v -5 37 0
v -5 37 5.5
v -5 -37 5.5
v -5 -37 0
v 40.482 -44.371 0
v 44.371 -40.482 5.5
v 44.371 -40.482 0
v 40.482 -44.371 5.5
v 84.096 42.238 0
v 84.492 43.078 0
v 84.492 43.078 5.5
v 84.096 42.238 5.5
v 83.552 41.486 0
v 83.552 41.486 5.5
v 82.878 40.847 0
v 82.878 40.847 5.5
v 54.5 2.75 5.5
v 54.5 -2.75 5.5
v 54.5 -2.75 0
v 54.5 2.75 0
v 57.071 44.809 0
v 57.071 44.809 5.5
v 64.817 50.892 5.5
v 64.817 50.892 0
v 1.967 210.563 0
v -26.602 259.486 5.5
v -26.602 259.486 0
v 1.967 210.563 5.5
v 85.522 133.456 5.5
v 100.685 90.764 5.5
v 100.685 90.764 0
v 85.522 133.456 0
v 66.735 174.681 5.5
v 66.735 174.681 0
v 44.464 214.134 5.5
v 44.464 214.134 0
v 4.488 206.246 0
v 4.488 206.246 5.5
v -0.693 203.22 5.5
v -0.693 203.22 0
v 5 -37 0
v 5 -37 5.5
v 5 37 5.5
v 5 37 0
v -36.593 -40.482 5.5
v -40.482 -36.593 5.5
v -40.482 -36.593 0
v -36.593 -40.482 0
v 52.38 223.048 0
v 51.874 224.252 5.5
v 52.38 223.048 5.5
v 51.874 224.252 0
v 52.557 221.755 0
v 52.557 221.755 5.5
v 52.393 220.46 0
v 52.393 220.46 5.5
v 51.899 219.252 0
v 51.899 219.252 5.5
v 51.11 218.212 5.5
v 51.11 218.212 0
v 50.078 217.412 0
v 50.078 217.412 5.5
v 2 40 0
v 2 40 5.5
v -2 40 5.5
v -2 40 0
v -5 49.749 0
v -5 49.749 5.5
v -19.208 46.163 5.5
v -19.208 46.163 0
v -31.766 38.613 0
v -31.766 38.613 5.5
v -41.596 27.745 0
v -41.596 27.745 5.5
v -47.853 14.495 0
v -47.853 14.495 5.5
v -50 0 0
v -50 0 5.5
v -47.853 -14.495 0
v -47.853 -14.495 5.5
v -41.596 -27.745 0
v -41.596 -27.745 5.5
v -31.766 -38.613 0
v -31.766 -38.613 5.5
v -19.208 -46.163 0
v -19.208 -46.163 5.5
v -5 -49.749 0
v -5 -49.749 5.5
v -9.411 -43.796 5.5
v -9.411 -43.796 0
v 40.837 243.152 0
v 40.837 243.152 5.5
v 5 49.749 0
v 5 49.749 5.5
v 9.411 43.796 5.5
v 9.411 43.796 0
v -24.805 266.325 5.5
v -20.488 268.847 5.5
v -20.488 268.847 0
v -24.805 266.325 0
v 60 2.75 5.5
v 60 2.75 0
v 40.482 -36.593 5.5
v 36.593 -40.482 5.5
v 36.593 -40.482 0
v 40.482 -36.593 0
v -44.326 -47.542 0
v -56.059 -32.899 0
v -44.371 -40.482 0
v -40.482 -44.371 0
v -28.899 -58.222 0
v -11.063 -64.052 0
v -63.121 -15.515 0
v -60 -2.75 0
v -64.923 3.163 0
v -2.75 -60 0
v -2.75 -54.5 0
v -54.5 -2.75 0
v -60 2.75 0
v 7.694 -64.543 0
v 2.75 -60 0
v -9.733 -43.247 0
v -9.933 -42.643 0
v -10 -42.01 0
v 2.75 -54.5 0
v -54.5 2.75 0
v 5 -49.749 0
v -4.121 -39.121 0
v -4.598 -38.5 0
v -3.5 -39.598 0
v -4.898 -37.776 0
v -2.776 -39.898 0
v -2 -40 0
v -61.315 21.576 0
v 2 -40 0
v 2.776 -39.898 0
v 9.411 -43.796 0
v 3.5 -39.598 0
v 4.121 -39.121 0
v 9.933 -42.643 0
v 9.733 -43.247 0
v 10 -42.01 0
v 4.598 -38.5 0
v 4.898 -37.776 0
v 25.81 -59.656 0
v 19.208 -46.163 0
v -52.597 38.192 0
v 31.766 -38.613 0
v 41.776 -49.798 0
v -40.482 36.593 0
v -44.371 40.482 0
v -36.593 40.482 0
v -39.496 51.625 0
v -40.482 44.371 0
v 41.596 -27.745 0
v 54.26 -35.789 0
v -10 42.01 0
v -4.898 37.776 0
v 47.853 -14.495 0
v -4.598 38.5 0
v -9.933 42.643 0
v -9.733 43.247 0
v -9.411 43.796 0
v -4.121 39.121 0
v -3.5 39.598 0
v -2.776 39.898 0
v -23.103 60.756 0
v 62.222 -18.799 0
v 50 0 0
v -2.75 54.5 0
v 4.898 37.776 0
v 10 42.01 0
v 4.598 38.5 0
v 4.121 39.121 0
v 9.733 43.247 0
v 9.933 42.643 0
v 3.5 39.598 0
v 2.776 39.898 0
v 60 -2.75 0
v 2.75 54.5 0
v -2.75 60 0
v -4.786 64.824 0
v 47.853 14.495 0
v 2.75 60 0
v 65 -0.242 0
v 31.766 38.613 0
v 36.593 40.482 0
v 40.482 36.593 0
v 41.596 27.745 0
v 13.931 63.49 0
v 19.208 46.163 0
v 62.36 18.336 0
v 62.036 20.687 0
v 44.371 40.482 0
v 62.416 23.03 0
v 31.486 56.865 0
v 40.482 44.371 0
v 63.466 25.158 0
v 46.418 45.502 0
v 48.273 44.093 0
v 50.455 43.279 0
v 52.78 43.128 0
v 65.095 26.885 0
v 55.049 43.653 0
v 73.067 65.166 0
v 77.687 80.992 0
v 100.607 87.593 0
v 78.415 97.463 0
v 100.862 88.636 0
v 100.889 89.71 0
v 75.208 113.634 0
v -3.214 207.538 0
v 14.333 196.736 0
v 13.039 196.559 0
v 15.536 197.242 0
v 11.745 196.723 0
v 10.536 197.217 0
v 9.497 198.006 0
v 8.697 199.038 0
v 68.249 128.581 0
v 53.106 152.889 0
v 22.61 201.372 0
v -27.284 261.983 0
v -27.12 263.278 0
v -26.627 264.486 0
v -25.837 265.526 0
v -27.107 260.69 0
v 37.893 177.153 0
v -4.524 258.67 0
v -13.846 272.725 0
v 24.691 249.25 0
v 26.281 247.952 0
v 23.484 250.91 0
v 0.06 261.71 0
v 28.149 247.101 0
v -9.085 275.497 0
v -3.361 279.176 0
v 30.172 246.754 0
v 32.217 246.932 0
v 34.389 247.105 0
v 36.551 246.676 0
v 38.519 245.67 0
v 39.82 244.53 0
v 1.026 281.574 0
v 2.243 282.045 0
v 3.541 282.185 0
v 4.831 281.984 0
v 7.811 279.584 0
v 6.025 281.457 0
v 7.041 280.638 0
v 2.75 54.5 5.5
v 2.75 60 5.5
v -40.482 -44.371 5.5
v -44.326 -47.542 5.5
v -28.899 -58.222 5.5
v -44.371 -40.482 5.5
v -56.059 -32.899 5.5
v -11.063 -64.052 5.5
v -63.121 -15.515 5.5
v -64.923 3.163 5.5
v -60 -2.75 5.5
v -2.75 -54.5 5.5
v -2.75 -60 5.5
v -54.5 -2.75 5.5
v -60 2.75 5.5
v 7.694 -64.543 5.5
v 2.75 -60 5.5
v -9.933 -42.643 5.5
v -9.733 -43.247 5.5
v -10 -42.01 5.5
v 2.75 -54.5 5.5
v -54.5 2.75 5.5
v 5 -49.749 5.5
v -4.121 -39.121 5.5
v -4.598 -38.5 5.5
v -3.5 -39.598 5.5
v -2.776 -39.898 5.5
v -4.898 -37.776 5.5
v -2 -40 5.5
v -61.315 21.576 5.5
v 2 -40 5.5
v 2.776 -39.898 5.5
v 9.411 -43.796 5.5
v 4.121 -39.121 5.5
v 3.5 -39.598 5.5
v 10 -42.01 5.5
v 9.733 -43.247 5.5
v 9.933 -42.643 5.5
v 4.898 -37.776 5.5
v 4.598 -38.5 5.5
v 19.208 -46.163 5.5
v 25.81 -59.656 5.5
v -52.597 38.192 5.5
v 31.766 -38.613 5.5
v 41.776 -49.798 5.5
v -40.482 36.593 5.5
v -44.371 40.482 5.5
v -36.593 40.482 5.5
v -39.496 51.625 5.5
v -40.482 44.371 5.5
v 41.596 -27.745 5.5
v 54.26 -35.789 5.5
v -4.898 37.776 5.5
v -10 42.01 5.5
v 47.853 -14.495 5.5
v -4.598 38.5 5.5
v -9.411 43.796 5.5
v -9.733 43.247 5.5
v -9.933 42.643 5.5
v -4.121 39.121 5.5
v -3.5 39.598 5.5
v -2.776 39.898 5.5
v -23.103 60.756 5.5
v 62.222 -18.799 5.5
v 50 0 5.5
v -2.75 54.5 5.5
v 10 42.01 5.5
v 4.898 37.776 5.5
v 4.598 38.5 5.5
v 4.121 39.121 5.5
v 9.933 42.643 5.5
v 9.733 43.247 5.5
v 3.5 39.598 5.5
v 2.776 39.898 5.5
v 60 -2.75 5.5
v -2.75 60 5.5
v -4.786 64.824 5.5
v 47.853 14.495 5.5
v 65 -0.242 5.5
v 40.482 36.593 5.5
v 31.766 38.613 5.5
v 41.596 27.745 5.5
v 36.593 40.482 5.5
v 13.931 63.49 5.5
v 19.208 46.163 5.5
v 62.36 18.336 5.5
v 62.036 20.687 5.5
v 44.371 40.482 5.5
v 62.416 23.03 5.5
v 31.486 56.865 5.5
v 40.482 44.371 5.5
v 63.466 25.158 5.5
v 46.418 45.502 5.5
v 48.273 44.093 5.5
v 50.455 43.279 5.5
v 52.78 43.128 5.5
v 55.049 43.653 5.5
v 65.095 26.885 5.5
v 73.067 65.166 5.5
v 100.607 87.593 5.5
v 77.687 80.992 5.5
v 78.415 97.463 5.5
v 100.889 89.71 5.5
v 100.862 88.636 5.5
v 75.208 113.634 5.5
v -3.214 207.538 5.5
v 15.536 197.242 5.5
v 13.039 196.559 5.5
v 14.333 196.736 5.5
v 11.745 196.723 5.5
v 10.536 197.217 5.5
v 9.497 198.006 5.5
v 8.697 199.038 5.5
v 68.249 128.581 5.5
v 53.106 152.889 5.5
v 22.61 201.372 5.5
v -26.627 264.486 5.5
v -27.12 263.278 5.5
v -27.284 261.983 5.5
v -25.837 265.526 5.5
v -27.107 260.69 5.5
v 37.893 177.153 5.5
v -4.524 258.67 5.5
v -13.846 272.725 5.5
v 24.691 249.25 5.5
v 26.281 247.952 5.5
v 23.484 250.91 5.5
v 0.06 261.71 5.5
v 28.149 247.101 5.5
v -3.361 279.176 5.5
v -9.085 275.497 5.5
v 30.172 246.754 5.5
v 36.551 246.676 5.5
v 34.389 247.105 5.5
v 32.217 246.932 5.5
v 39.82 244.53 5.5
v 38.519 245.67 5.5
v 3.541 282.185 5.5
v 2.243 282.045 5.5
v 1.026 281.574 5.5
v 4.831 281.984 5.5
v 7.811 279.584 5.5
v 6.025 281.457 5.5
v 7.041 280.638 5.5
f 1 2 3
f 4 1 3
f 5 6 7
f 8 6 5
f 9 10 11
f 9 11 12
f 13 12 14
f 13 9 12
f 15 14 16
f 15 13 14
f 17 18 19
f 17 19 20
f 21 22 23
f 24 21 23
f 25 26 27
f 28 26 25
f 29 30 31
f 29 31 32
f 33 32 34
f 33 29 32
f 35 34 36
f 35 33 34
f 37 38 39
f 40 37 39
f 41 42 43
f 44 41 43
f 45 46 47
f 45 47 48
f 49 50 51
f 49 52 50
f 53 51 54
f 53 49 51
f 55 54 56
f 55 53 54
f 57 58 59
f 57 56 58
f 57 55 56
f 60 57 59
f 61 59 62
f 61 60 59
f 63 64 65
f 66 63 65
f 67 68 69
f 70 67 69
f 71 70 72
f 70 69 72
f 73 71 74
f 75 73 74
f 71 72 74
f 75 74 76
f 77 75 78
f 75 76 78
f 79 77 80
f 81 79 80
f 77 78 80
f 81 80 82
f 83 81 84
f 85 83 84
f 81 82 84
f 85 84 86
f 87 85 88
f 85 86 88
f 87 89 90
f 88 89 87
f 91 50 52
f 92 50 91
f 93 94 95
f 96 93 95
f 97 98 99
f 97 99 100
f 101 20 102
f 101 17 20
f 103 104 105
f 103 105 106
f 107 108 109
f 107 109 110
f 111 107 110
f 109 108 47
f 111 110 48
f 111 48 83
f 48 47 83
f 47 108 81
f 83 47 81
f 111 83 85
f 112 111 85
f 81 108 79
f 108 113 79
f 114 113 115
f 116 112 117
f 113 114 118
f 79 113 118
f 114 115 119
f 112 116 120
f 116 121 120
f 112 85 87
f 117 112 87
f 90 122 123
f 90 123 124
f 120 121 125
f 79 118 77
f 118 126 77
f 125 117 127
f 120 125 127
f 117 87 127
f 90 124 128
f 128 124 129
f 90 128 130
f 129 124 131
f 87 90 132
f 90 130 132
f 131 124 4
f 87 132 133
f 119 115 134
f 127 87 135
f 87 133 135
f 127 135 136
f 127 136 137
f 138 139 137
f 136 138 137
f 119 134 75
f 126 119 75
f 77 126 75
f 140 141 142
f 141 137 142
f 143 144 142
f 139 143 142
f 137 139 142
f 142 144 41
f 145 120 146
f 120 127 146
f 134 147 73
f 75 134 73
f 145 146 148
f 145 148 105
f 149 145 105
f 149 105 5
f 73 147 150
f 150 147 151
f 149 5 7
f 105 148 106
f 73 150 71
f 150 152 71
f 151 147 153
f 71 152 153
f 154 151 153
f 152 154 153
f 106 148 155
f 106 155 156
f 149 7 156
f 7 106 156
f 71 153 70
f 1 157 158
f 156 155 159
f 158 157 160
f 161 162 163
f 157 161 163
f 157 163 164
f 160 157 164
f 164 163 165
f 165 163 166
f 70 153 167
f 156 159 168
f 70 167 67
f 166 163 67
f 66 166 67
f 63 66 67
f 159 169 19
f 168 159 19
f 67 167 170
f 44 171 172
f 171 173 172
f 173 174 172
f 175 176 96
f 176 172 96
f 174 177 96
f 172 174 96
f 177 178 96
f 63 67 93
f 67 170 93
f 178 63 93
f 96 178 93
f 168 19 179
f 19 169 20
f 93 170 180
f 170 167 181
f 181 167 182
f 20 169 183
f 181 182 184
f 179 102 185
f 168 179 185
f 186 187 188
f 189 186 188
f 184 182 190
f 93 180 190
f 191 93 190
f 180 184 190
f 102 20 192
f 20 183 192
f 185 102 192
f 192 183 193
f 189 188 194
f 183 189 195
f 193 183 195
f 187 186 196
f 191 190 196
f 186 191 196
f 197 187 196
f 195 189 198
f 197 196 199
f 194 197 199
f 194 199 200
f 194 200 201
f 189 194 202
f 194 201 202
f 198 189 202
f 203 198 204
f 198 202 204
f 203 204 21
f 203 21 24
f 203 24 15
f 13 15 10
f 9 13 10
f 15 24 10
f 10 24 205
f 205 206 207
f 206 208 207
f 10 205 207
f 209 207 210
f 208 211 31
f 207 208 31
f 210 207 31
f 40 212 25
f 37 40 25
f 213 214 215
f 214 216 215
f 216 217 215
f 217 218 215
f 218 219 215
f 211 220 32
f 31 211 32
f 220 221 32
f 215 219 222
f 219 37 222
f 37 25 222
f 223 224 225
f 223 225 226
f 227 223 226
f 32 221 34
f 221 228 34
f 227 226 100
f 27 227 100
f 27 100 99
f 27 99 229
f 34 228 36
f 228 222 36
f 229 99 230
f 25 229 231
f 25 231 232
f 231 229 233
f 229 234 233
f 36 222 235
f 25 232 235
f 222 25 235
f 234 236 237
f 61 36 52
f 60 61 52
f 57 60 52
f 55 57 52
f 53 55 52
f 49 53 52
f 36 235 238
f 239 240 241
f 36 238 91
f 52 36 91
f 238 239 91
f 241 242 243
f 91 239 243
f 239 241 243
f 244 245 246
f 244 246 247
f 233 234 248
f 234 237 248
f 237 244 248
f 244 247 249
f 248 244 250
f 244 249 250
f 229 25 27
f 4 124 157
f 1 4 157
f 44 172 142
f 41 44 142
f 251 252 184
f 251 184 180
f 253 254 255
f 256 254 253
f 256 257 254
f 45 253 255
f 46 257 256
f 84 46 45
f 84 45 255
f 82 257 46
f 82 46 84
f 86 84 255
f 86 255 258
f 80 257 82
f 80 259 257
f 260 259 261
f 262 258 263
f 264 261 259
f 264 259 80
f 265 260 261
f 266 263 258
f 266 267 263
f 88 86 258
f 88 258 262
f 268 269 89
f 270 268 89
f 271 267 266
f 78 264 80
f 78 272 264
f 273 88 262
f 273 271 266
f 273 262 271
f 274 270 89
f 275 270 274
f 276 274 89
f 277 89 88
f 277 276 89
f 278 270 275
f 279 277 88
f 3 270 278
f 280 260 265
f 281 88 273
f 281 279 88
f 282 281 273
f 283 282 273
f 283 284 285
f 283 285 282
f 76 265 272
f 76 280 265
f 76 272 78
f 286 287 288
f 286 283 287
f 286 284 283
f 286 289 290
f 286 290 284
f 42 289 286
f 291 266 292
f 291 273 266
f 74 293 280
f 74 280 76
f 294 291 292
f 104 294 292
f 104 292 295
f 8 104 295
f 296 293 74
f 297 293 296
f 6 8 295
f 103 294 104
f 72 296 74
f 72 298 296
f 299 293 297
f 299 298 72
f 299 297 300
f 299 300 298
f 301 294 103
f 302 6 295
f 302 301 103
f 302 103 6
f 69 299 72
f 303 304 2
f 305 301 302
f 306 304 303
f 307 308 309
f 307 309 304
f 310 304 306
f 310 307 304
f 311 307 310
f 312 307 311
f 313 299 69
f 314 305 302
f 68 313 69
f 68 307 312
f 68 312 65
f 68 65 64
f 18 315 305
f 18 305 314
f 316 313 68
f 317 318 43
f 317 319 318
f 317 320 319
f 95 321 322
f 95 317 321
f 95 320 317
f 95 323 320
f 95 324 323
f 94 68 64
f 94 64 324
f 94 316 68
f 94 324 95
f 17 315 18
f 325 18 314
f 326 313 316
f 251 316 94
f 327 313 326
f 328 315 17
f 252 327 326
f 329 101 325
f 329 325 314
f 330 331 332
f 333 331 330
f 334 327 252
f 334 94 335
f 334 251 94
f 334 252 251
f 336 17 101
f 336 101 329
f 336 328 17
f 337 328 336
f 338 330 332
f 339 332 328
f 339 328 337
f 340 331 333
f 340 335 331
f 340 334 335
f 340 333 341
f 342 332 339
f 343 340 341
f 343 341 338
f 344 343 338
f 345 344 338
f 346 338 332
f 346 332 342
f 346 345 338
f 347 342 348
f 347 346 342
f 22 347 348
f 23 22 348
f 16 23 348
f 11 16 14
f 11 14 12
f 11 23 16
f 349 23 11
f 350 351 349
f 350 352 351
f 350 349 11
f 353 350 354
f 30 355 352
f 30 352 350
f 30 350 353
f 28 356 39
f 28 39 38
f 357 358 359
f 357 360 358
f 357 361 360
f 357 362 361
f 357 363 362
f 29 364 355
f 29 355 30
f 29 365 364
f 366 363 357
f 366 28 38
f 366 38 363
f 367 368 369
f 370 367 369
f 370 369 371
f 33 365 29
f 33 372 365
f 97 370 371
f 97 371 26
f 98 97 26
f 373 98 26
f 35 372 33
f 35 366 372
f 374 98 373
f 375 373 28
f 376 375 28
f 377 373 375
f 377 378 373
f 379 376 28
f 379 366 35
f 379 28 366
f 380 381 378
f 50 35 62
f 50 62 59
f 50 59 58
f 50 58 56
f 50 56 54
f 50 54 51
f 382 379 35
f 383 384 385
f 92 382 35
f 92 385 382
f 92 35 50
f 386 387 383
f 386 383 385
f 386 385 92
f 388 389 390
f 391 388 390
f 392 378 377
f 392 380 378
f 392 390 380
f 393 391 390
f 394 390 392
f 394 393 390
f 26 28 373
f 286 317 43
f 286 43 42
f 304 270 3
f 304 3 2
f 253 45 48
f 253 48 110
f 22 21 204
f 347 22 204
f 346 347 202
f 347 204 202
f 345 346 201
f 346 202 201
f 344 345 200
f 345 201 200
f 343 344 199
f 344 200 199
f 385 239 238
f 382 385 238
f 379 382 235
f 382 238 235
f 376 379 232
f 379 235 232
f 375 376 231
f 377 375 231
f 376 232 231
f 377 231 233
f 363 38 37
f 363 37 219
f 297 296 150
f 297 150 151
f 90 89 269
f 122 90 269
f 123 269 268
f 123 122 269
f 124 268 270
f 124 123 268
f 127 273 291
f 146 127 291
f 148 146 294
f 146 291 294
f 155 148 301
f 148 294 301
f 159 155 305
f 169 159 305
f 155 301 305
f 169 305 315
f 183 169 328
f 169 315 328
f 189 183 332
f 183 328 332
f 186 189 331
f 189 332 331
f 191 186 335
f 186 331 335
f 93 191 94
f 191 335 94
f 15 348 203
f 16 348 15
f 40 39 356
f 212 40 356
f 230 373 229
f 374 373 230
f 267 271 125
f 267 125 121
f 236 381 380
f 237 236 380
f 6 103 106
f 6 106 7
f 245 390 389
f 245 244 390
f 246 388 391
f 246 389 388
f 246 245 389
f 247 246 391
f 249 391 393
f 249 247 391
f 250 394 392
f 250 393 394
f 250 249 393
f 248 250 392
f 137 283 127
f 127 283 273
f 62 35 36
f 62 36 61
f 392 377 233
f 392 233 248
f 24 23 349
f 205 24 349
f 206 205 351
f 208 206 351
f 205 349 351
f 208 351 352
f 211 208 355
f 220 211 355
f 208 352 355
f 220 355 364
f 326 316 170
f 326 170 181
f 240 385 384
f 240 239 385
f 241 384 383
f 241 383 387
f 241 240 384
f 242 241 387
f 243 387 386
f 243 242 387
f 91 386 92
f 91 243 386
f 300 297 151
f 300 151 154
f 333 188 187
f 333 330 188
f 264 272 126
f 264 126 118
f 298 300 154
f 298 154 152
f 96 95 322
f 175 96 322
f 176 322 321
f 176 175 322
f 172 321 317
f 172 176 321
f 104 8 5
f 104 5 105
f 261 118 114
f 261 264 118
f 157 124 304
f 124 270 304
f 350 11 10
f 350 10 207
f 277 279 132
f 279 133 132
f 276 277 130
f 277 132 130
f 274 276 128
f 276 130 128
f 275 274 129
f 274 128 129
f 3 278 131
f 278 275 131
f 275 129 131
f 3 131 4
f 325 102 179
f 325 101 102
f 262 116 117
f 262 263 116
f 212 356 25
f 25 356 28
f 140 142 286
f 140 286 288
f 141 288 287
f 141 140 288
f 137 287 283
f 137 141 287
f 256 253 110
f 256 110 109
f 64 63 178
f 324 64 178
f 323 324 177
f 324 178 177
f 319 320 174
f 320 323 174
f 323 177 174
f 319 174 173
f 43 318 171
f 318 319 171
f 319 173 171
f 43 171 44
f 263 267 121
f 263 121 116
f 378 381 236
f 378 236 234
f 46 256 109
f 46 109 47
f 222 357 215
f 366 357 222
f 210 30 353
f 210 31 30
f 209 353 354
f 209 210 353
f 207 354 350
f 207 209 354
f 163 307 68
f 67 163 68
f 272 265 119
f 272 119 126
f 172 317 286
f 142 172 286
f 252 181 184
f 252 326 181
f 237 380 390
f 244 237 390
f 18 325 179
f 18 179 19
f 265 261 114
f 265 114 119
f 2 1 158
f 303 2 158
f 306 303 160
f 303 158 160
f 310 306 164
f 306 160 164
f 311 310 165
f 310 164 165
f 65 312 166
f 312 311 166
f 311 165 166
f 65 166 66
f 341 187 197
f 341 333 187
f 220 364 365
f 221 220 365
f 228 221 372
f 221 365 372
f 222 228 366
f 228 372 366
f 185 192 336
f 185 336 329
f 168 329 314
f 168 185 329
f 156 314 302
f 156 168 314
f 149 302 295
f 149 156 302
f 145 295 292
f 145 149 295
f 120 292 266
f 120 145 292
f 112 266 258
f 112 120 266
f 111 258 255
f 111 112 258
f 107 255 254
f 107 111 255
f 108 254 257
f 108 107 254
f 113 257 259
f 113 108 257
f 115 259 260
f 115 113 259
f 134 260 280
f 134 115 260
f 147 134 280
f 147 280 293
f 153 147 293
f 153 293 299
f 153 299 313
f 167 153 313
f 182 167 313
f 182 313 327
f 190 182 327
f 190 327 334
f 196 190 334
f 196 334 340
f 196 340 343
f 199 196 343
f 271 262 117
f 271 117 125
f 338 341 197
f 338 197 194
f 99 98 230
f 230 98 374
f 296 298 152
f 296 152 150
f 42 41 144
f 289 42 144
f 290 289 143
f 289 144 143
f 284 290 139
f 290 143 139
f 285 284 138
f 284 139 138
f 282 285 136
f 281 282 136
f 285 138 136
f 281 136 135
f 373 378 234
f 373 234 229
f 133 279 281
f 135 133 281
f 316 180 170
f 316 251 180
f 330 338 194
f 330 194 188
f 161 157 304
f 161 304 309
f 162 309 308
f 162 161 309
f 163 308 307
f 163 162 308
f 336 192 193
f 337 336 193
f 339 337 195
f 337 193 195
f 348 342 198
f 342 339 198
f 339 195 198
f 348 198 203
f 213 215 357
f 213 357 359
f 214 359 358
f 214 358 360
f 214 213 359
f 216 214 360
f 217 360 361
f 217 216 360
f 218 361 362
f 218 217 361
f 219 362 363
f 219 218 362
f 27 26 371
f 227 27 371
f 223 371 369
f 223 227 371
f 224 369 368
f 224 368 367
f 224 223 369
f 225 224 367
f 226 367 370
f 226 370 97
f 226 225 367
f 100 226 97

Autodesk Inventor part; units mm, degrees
ref_plane "YZ Plane" through (0, 0, 0) normal (1, 0, 0) x (0, 1, 0)
ref_plane "XZ Plane" through (0, 0, 0) normal (0, 1, 0) x (-1, 0, 0)
ref_plane "XY Plane" through (0, 0, 0) normal (0, 0, 1) x (1, 0, 0)
sketch "Sketch1" plane through (0, 0, 0) normal (0, 0, 1) x (1, 0, 0)
  circle A0 centre (0, 0) radius 65
  dimension "d0" = 130
extrude "Extrusion1" add sketch "Sketch1" along normal blind 5.5
sketch "Sketch5" plane through (0, 0, 5.5) normal (0, 0, 1) x (1, 0, 0)
  line L0 (54.5, 2.75) -> (60, 2.75)
  line L1 (60, 2.75) -> (60, -2.75)
  line L2 (60, -2.75) -> (54.5, -2.75)
  line L3 (54.5, -2.75) -> (54.5, 2.75)
  line L4 (36.5928, 40.4819) -> (40.4819, 44.371)
  line L5 (40.4819, 44.371) -> (44.371, 40.4819)
  line L6 (44.371, 40.4819) -> (40.4819, 36.5928)
  line L7 (40.4819, 36.5928) -> (36.5928, 40.4819)
  line L8 (-2.75, 54.5) -> (-2.75, 60)
  line L9 (-2.75, 60) -> (2.75, 60)
  line L10 (2.75, 60) -> (2.75, 54.5)
  line L11 (2.75, 54.5) -> (-2.75, 54.5)
  line L12 (-40.4819, 36.5928) -> (-44.371, 40.4819)
  line L13 (-44.371, 40.4819) -> (-40.4819, 44.371)
  line L14 (-40.4819, 44.371) -> (-36.5928, 40.4819)
  line L15 (-36.5928, 40.4819) -> (-40.4819, 36.5928)
  line L16 (-54.5, -2.75) -> (-60, -2.75)
  line L17 (-60, -2.75) -> (-60, 2.75)
  line L18 (-60, 2.75) -> (-54.5, 2.75)
  line L19 (-54.5, 2.75) -> (-54.5, -2.75)
  line L20 (-36.5928, -40.4819) -> (-40.4819, -44.371)
  line L21 (-40.4819, -44.371) -> (-44.371, -40.4819)
  line L22 (-44.371, -40.4819) -> (-40.4819, -36.5928)
  line L23 (-40.4819, -36.5928) -> (-36.5928, -40.4819)
  line L24 (2.75, -54.5) -> (2.75, -60)
  line L25 (2.75, -60) -> (-2.75, -60)
  line L26 (-2.75, -60) -> (-2.75, -54.5)
  line L27 (-2.75, -54.5) -> (2.75, -54.5)
  line L28 (40.4819, -36.5928) -> (44.371, -40.4819)
  line L29 (44.371, -40.4819) -> (40.4819, -44.371)
  line L30 (40.4819, -44.371) -> (36.5928, -40.4819)
  line L31 (36.5928, -40.4819) -> (40.4819, -36.5928)
  point P0 (0, 0)
  dimension "d30" = 5.5
  dimension "d31" = 5.5
  dimension "d34" = 360
extrude "Extrusion5" cut sketch "Sketch5" against normal blind 10
sketch "Sketch7" plane through (0, 0, 5.5) normal (0, 0, 1) x (1, 0, 0)
  circle A0 centre (0, 0) radius 65 projected
  line L0 (51.1247, 40.1406) -> (64.8175, 50.8915)
  line L1 (60.6454, 23.3909) -> (84.0046, 41.7313)
  line L2 (84.0046, 41.7313) -> (101.175, 89.1614)
  arc A1 (68.2492, 128.5806) -> (22.61, 201.3724) centre (-8338.3582, -5091.5201) ccw
  arc A2 (101.175, 89.1614) -> (44.4638, 214.134) centre (-401.1925, -63.4539) ccw
  arc A3 (64.8175, 50.8915) -> (68.2492, 128.5806) centre (9.7334, 92.245) ccw
  line L3 (-9.0847, 275.4971) -> (0.0597, 261.7096)
  line L4 (0.0597, 261.7096) -> (-4.5238, 258.6697)
  line L5 (-4.5238, 258.6697) -> (-13.846, 272.7251)
  line L6 (-20.4878, 268.8466) -> (-13.846, 272.7251)
  line L7 (-9.0847, 275.4971) -> (-3.3614, 279.1755)
  line L8 (-20.4878, 268.8466) -> (-29.1232, 263.8039)
  line L9 (-3.3614, 279.1755) -> (5.4134, 283.9717)
  line L10 (11.2184, 194.7202) -> (22.61, 201.3724)
  line L11 (44.4638, 214.134) -> (54.3957, 219.9338)
  line L12 (4.4881, 206.2457) -> (-0.6932, 203.2201)
  line L13 (-0.6932, 203.2201) -> (-3.2145, 207.5378)
  line L14 (-3.2145, 207.5378) -> (1.9667, 210.5634)
  line L15 (-29.1232, 263.8039) -> (1.9667, 210.5634)
  line L16 (4.4881, 206.2457) -> (11.2184, 194.7202)
  line L17 (54.3957, 219.9338) -> (37.2403, 249.3118)
  line L18 (37.2403, 249.3118) -> (27.3211, 243.8901)
  line L19 (27.3211, 243.8901) -> (5.4134, 283.9717)
  dimension "d40" = 250
  dimension "d41" = 20
  dimension "d50" = 5.5
  dimension "d53" = 10
  dimension "d54" = 80
  dimension "d55" = 50
  dimension "d56" = 10
  dimension "d57" = 6
  dimension "d58" = 5
extrude "Extrusion6" add sketch "Sketch7" against normal blind 5.5 contours A0 L0 A3 A1 L10 L16 L12 L13 L14 L15 L8 L6 L5 L4 L3 L7 L9 L19 L18 L17 L11 A2 L2 L1
sketch "Sketch8" plane through (0, 0, 5.5) normal (0, 0, 1) x (1, 0, 0)
  circle A0 centre (0, 0) radius 50
  line L0 (10, 43) -> (10, -43)
  line L1 (-10, -43) -> (-10, 43)
  line L2 (5, 40) -> (-5, 40)
  line L3 (-5, 40) -> (-5, -40)
  line L4 (-5, -40) -> (5, -40)
  line L5 (5, -40) -> (5, 40)
  line L6 (10, -43) -> (5, -49.7494)
  line L7 (-10, -43) -> (-5, -49.7494)
  line L8 (-10, 43) -> (-5, 49.7494)
  line L9 (5, 49.7494) -> (10, 43)
  dimension "d44" = 100
  dimension "d45" = 10
  dimension "d46" = 80
extrude "Extrusion7" cut sketch "Sketch8" against normal blind 5.5 contours A0 L6 L0 L9 | L8 L1 L7 A0 | L5 L4 L3 L2
fillet "Fillet1" radius 3 8 edges at (10, 43, 2.75) (10, -43, 2.75) (-5, 40, 2.75) (-10, -43, 2.75) (5, 40, 2.75) (-10, 43, 2.75) (-5, -40, 2.75) (5, -40, 2.75)
fillet "Fillet2" radius 5 2 edges at (101.175, 89.1614, 2.75) (84.0046, 41.7313, 2.75)
fillet "Fillet3" radius 8 2 edges at (60.6454, 23.3909, 2.75) (51.1247, 40.1406, 2.75)
fillet "Fillet4" radius 5 4 edges at (54.3957, 219.9338, 2.75) (11.2184, 194.7202, 2.75) (5.4134, 283.9717, 2.75) (-29.1232, 263.8039, 2.75)
fillet "Fillet5" radius 8 2 edges at (27.3211, 243.8901, 2.75) (37.2403, 249.3118, 2.75)
properties part number "base"
